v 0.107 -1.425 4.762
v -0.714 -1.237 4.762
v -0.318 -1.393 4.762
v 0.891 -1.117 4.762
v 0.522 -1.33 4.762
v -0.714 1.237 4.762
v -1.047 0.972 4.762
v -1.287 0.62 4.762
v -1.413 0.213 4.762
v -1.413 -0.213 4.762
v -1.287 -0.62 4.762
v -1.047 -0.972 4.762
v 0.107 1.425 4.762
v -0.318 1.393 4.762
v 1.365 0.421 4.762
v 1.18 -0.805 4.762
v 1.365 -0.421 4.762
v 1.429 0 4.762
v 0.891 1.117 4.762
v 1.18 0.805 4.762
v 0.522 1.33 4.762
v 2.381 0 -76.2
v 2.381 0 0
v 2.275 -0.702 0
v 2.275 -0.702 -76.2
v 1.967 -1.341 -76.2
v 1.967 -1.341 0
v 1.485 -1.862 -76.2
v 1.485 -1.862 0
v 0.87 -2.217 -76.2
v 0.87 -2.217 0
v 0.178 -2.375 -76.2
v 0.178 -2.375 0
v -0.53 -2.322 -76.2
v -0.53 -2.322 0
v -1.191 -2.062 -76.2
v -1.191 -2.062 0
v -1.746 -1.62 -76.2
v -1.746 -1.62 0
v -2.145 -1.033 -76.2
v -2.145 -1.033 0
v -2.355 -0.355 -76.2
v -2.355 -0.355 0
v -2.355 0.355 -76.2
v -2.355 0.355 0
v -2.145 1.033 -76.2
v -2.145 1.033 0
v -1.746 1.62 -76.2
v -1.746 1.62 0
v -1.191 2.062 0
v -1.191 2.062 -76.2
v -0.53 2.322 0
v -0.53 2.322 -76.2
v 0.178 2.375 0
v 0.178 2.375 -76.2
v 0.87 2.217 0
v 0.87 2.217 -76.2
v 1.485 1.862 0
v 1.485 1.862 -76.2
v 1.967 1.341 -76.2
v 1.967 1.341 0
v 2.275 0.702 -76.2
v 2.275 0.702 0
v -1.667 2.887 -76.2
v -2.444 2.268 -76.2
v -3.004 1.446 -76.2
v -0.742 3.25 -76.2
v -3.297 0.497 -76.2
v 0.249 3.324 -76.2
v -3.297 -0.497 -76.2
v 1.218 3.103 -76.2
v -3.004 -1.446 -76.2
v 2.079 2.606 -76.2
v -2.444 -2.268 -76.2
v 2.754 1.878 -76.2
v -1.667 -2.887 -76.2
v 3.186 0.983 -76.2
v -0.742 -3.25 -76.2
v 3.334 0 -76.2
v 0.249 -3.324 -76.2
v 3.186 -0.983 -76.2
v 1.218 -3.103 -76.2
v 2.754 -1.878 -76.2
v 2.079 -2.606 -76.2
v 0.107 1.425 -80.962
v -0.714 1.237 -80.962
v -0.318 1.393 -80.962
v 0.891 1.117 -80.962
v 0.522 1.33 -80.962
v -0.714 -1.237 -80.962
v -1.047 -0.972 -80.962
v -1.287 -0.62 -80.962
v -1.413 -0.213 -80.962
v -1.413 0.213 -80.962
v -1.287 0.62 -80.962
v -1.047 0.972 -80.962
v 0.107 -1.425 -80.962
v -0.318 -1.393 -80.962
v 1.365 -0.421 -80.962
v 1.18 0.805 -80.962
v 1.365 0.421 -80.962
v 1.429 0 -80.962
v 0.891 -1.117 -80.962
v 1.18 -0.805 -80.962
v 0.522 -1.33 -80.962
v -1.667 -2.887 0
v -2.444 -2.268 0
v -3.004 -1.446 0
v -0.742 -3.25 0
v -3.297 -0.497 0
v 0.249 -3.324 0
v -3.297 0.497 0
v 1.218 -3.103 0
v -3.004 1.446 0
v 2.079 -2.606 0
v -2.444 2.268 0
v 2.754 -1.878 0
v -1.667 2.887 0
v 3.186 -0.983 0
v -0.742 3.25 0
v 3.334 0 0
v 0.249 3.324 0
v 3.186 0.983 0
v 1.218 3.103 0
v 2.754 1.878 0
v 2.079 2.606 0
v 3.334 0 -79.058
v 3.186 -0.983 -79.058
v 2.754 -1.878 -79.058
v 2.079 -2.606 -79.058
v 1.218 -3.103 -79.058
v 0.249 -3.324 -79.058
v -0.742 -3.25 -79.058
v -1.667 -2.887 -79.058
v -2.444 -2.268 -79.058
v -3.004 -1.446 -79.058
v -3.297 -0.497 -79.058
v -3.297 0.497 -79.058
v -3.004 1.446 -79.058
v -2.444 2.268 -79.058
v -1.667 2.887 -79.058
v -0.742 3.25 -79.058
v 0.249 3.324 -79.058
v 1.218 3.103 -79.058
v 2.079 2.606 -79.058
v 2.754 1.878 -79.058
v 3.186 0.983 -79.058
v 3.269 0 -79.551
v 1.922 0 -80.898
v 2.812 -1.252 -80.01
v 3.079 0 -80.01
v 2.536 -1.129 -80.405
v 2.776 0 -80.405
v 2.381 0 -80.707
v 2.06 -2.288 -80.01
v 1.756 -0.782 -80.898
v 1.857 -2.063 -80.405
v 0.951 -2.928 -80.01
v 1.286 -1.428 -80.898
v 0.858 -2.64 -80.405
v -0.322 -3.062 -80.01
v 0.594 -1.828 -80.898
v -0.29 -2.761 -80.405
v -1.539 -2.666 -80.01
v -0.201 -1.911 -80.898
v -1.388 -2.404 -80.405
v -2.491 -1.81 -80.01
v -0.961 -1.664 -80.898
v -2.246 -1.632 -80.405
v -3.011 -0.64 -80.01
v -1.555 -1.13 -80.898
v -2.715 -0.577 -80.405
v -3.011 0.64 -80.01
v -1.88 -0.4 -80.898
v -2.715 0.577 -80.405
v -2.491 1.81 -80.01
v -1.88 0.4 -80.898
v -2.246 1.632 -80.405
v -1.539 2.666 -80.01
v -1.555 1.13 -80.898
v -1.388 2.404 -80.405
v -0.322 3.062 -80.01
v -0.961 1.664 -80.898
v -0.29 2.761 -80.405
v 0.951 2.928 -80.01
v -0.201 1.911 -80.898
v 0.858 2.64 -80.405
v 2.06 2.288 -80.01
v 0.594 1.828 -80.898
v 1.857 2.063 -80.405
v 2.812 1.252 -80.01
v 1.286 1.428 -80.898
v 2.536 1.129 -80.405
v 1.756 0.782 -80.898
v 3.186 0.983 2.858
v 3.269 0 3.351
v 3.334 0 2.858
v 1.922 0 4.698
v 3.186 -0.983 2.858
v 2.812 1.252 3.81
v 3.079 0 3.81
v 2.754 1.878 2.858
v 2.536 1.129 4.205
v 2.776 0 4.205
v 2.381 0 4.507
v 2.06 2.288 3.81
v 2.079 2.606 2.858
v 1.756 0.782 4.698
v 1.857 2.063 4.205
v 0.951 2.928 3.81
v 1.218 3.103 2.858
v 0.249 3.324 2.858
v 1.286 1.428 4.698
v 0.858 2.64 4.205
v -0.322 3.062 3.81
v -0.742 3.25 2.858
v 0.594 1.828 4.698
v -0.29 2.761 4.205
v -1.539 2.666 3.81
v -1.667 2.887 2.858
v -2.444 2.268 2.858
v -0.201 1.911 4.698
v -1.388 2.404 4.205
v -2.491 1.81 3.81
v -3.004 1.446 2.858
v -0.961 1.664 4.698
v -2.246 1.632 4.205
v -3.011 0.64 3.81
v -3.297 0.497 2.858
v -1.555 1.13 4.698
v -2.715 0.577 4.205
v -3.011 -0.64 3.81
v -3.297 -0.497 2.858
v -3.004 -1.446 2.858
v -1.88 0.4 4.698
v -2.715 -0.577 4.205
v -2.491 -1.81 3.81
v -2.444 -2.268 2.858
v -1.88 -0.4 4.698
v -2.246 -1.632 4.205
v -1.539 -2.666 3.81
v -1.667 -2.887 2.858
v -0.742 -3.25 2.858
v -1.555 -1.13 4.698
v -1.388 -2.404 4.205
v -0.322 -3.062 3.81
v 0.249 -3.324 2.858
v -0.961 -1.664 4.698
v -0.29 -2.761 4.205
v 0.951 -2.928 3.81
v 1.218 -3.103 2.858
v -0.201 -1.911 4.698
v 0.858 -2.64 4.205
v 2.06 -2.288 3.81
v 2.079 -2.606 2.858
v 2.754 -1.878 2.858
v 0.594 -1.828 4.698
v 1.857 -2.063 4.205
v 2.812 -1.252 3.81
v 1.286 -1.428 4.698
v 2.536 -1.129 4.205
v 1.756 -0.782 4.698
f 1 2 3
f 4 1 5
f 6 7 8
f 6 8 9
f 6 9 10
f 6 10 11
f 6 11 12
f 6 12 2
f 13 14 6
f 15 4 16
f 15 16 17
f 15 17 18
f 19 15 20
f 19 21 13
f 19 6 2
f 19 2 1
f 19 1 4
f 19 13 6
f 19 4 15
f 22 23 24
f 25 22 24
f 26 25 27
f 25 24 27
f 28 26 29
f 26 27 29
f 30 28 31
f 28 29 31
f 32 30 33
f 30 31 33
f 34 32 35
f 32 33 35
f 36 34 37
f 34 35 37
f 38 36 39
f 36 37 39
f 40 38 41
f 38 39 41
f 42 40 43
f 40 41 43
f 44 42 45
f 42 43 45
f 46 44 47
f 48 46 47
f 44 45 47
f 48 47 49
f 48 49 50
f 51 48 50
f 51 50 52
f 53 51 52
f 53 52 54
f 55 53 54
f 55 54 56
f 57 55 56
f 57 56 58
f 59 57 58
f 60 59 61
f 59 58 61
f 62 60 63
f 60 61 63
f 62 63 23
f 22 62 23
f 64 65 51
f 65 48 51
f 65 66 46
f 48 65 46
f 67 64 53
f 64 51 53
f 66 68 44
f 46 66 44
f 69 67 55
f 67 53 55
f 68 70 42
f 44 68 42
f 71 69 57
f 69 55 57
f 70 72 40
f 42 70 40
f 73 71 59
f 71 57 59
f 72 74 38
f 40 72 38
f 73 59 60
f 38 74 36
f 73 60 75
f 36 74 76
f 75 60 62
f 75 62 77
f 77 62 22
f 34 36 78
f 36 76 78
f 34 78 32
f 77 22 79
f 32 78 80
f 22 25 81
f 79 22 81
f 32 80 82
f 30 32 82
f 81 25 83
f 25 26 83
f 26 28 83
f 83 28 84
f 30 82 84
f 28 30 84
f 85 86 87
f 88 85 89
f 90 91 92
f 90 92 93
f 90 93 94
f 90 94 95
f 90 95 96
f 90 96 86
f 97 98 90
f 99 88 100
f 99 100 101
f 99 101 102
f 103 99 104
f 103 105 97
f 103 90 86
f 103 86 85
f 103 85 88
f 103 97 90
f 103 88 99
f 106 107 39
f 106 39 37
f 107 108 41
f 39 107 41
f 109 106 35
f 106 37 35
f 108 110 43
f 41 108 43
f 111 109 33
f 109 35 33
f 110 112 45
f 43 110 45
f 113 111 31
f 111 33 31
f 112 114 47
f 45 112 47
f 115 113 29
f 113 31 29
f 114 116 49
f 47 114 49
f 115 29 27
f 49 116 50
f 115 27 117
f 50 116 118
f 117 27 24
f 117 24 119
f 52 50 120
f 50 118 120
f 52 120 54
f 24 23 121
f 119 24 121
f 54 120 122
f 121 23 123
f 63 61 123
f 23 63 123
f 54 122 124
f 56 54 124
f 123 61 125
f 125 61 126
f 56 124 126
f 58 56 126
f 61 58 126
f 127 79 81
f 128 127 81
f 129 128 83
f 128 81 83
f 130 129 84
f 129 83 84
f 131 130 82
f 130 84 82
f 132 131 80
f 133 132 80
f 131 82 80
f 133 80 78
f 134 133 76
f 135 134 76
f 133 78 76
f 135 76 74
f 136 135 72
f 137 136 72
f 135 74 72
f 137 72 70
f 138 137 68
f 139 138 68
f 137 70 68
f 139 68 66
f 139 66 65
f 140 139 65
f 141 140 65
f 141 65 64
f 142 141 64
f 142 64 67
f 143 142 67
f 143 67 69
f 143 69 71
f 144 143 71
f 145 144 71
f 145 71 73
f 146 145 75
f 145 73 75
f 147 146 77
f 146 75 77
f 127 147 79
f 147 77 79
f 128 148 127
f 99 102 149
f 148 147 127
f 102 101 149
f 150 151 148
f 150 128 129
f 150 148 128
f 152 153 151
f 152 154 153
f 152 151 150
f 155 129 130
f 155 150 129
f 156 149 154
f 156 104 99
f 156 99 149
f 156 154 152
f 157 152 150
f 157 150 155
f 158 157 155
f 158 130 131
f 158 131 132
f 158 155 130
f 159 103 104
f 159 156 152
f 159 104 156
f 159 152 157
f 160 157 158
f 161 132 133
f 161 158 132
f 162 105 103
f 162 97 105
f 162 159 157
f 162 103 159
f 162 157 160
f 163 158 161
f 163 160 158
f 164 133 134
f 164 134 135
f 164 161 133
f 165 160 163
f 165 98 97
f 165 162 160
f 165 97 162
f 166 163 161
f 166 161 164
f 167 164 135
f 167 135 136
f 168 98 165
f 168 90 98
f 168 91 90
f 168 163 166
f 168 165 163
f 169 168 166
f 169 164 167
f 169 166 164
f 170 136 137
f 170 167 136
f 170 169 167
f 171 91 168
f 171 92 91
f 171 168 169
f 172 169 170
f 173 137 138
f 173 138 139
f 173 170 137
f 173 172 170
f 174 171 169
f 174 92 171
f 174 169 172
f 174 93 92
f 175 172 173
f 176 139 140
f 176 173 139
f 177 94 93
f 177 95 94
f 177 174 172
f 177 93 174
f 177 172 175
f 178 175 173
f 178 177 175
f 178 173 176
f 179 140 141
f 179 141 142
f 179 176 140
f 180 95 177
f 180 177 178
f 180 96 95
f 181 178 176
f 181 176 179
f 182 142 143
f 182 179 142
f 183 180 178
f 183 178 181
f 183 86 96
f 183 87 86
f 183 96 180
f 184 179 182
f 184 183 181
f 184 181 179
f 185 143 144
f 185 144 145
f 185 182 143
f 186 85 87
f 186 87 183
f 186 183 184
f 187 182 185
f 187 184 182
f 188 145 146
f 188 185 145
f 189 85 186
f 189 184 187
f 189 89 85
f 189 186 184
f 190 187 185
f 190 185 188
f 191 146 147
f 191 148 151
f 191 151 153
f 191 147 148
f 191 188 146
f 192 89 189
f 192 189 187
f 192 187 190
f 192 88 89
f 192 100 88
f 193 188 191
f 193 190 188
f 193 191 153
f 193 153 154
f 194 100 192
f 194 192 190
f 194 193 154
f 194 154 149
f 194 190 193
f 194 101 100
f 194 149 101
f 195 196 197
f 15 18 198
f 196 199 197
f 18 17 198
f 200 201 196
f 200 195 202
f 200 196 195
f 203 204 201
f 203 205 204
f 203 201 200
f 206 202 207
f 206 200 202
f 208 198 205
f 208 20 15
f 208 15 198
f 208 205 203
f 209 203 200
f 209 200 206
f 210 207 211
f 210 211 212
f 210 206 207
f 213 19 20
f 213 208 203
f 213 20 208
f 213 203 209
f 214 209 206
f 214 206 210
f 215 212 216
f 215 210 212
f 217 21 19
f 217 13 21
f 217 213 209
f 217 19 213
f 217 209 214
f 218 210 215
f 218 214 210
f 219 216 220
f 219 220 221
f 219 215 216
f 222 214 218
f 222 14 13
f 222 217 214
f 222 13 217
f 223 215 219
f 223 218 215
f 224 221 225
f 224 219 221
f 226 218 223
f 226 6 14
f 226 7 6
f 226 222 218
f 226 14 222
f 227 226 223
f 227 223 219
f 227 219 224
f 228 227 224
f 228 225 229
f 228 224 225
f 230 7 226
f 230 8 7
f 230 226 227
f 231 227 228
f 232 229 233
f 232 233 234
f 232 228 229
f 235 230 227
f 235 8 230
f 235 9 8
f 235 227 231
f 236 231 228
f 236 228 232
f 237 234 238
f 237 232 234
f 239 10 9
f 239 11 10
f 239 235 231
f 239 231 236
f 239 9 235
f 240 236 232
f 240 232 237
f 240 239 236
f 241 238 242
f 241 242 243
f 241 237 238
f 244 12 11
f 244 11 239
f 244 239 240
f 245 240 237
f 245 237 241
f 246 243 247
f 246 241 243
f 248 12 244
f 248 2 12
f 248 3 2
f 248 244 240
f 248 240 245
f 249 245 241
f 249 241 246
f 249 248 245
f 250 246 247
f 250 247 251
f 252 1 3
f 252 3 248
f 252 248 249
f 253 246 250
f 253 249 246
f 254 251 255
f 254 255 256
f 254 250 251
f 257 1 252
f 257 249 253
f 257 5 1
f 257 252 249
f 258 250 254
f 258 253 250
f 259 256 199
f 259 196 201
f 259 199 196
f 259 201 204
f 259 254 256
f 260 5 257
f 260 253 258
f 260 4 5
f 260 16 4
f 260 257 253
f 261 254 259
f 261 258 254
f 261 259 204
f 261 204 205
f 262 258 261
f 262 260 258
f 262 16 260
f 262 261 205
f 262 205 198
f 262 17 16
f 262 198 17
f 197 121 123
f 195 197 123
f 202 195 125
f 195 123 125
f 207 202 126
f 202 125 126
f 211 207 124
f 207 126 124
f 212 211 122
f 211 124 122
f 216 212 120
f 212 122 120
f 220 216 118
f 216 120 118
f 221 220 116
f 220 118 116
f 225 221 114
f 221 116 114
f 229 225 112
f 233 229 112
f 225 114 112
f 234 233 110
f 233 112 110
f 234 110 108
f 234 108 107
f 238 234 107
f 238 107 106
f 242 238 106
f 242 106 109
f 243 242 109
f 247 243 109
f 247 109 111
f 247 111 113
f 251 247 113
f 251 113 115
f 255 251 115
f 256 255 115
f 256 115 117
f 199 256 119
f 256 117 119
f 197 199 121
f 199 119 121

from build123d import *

# Parameters (mm, degrees)
F0_R     = 3.33375
F1_DEPTH = 4.7625
F2_R     = 2.38125
F3_DEPTH = 76.2
F4_R     = 3.33375
F5_DEPTH = 4.7625
F6_R     = 1.905


with BuildPart() as f1:
    # F0 (on Top) → F1 (new body)
    with BuildSketch(Plane.XY):
        Circle(F0_R)
    extrude(amount=F1_DEPTH)

    # F2 (on face) → F3 (join)
    with BuildSketch(Plane(origin=(0, 0, 0), x_dir=(1, 0, 0), z_dir=(0, 0, -1))):
        Circle(F2_R)
    extrude(amount=F3_DEPTH)

    # F4 (on face) → F5 (join)
    with BuildSketch(Plane(origin=(0, 0, -76.2), x_dir=(1, 0, 0), z_dir=(0, 0, -1))):
        Circle(F4_R)
    extrude(amount=F5_DEPTH)

    # F6
    f6_edges = [f1.edges().sort_by_distance(p)[0] for p in [
        (-3.33375, 0, 4.7625),
        (-3.33375, 0, -80.9625),
    ]]
    fillet(f6_edges, radius=F6_R)


solid = f1.part
